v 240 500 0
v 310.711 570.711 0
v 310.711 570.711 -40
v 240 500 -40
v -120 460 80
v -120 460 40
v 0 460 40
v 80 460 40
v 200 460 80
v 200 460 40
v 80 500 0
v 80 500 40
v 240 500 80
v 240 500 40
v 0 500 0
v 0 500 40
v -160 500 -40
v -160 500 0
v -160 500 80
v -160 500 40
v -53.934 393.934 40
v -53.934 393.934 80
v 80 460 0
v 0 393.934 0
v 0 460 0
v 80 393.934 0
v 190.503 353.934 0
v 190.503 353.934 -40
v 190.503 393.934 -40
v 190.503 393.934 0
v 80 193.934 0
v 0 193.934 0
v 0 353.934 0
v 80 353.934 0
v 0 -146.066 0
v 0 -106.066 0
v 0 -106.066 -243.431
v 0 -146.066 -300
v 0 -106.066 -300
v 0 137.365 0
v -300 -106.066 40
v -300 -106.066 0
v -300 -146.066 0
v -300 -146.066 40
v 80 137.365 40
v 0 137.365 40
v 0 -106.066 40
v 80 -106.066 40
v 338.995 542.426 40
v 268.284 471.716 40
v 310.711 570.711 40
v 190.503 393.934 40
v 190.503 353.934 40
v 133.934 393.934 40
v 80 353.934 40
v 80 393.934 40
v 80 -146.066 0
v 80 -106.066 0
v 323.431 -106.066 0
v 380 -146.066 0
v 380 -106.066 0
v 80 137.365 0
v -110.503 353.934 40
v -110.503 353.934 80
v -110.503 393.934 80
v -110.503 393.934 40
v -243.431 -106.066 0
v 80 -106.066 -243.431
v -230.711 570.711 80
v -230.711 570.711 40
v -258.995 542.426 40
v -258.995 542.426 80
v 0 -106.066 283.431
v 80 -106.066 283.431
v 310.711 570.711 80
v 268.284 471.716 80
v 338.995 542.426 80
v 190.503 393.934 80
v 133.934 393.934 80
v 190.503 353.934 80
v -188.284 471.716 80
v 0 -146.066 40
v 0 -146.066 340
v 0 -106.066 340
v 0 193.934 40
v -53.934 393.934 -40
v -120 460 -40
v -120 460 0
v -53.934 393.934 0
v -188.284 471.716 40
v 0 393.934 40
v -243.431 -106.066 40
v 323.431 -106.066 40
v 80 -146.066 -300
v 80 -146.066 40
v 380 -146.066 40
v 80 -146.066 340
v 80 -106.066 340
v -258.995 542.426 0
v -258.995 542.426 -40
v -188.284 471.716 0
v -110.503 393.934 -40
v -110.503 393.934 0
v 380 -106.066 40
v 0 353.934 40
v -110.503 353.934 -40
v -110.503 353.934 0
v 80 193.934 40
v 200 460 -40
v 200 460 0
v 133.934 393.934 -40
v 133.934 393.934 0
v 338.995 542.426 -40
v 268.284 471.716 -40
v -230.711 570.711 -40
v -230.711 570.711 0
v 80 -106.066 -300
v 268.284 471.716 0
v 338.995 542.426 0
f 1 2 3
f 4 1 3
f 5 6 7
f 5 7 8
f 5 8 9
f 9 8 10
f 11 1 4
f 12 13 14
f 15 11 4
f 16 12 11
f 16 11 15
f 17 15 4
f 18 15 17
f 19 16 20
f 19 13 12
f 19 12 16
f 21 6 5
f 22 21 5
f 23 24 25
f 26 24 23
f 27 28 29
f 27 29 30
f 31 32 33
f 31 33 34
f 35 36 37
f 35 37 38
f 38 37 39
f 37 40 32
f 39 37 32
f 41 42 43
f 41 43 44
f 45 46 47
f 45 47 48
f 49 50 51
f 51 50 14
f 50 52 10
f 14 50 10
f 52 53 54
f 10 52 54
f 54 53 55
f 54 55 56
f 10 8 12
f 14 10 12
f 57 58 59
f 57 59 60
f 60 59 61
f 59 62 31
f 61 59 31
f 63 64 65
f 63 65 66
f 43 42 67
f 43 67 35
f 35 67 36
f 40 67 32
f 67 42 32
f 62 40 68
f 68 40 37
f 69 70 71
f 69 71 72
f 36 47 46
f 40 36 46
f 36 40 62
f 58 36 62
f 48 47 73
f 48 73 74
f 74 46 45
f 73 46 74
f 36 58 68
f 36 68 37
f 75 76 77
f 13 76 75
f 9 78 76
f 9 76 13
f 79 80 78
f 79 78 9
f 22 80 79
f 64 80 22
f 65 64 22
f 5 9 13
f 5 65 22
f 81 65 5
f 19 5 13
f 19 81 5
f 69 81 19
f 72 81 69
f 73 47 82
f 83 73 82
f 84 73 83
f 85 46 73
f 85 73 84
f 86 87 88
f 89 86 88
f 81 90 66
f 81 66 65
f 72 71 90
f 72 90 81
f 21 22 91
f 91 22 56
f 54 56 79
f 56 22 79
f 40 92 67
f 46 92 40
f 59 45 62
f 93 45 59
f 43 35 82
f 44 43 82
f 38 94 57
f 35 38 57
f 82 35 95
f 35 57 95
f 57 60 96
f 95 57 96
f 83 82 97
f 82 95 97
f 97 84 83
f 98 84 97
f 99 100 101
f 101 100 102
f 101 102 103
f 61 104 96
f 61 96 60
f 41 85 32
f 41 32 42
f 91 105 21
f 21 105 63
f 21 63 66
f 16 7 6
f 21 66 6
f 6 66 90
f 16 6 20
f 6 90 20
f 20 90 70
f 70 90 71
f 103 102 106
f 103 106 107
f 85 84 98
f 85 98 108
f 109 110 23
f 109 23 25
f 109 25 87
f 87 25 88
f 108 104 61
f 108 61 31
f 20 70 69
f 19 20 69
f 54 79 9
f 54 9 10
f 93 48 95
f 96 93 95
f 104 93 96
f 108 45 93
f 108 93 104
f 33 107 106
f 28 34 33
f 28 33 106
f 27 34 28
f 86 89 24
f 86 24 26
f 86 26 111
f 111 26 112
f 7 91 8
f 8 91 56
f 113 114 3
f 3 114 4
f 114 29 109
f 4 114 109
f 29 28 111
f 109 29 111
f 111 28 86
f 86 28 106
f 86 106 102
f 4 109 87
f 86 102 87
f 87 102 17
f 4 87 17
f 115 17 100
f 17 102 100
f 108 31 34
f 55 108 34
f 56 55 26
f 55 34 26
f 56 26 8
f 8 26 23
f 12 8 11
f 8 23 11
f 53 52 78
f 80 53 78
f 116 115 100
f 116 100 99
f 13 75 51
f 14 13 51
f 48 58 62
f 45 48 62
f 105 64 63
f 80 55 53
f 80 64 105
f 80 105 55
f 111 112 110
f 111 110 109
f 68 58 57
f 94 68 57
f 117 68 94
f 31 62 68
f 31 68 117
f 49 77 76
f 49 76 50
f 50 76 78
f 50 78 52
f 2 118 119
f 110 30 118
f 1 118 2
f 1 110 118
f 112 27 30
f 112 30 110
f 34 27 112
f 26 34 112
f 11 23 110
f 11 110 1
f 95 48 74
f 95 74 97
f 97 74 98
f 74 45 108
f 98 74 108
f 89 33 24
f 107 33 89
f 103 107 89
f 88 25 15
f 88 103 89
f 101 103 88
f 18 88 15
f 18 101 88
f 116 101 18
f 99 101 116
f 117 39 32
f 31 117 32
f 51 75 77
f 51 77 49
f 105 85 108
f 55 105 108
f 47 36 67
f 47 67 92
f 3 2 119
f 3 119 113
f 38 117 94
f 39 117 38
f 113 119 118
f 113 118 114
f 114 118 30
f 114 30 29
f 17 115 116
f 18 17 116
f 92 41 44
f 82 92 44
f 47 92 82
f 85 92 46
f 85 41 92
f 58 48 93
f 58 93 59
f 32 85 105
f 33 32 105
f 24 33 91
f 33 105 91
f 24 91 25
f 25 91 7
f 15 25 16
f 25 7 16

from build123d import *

# Parameters (mm, degrees)
SKETCH_1_W          = 80
SKETCH_1_H          = 40
EXTRUDE_1_DEPTH     = 500
SKETCH_2_W          = 400
SKETCH_2_H          = 40
EXTRUDE_2_DEPTH     = 40
SKETCH_3_W          = 400
SKETCH_3_H          = 40
EXTRUDE_3_DEPTH     = 40
CUT_EXTRUDE_1_DEPTH = 121
SKETCH_5_W          = 40
SKETCH_5_H          = 150
EXTRUDE_4_DEPTH     = 40
SKETCH_6_W          = 40
SKETCH_6_H          = 40
EXTRUDE_5_DEPTH     = 100
SKETCH_7_W          = 40
SKETCH_7_H          = 150
EXTRUDE_6_DEPTH     = 40
SKETCH_8_W          = 40
SKETCH_8_H          = 40
EXTRUDE_7_DEPTH     = 100
SKETCH_9_W          = 40
SKETCH_9_H          = 150
EXTRUDE_8_DEPTH     = 40
SKETCH_10_W         = 40
SKETCH_10_H         = 40
EXTRUDE_9_DEPTH     = 100
CUT_EXTRUDE_2_DEPTH = 121
SKETCH_13_W         = 301.005050634
SKETCH_13_H         = 40
EXTRUDE_10_DEPTH    = 40
SKETCH_14_W         = 40
SKETCH_14_H         = 40
EXTRUDE_11_DEPTH    = 500
SKETCH_15_W         = 80
SKETCH_15_H         = 40
EXTRUDE_12_DEPTH    = 146.066017
EXTRUDE_13_REACH    = 411.497
SKETCH_17_W         = 40
SKETCH_17_H         = 40
CUT_EXTRUDE_3_DEPTH = 500
SKETCH_19_W         = 80
SKETCH_19_H         = 40
EXTRUDE_14_DEPTH    = 500
SKETCH_20_W         = 80
SKETCH_20_H         = 40
EXTRUDE_15_DEPTH    = 300
SKETCH_21_W         = 40
SKETCH_21_H         = 40
EXTRUDE_16_DEPTH    = 300
SKETCH_22_W         = 80
SKETCH_22_H         = 40
EXTRUDE_17_DEPTH    = 300
SKETCH_23_W         = 40
SKETCH_23_H         = 40
EXTRUDE_18_DEPTH    = 300
EXTRUDE_19_DEPTH    = 40
EXTRUDE_20_DEPTH    = 40
EXTRUDE_21_DEPTH    = 80
EXTRUDE_22_DEPTH    = 80


with BuildPart() as part:
    # 草图1 → 凸台-拉伸1 (new body)
    with BuildSketch(Plane(origin=(0, 0, 0), x_dir=(1, 0, 0), z_dir=(0, 1, 0))):
        with Locations((40, -20)):
            Rectangle(SKETCH_1_W, SKETCH_1_H)
    extrude(amount=EXTRUDE_1_DEPTH)

    # 草图2 → 凸台-拉伸2 (add)
    with BuildSketch(Plane.XY.offset(40)):
        with Locations((40, 480)):
            Rectangle(SKETCH_2_W, SKETCH_2_H)
    extrude(amount=EXTRUDE_2_DEPTH)

    # 草图3 → 凸台-拉伸3 (add)
    with BuildSketch(Plane(origin=(0, 0, 0), x_dir=(-1, 0, 0), z_dir=(0, 0, -1))):
        with Locations((-40, 480)):
            Rectangle(SKETCH_3_W, SKETCH_3_H)
    extrude(amount=EXTRUDE_3_DEPTH)

    # 草图4 → 切除-拉伸1 (cut, through all)
    with BuildSketch(Plane.XY.offset(80)):
        Polygon((-160, 500), (-120, 460), (-160, 460), align=None)
        Polygon((240, 500), (200, 460), (240, 460), align=None)
    extrude(amount=-CUT_EXTRUDE_1_DEPTH, mode=Mode.SUBTRACT)

    # 草图5 → 凸台-拉伸4 (add)
    with BuildSketch(Plane(origin=(-130, 130, 0), x_dir=(0, 0, -1), z_dir=(0.707106781, -0.707106781, 0))):
        with Locations((-60, 448.259018078)):
            Rectangle(SKETCH_5_W, SKETCH_5_H)
    extrude(amount=EXTRUDE_4_DEPTH)

    # 草图6 → 凸台-拉伸5 (add)
    with BuildSketch(Plane(origin=(370, 370, 0), x_dir=(0, 0, -1), z_dir=(0.707106781, 0.707106781, 0))):
        with Locations((-60, 163.847763108)):
            Rectangle(SKETCH_6_W, SKETCH_6_H)
    extrude(amount=EXTRUDE_5_DEPTH)

    # 草图7 → 凸台-拉伸6 (add)
    with BuildSketch(Plane(origin=(-130, 130, 0), x_dir=(0, 0, -1), z_dir=(0.707106781, -0.707106781, 0))):
        with Locations((20, 448.259018078)):
            Rectangle(SKETCH_7_W, SKETCH_7_H)
    extrude(amount=EXTRUDE_6_DEPTH)

    # 草图8 → 凸台-拉伸7 (add)
    with BuildSketch(Plane(origin=(370, 370, 0), x_dir=(0, 0, -1), z_dir=(0.707106781, 0.707106781, 0))):
        with Locations((20, 163.847763108)):
            Rectangle(SKETCH_8_W, SKETCH_8_H)
    extrude(amount=EXTRUDE_7_DEPTH)

    # 草图9 → 凸台-拉伸8 (add)
    with BuildSketch(Plane(origin=(170, 170, 0), x_dir=(0, 0, 1), z_dir=(-0.707106781, -0.707106781, 0))):
        with Locations((-20, 391.690475583)):
            Rectangle(SKETCH_9_W, SKETCH_9_H)
        with Locations((60, 391.690475583)):
            Rectangle(SKETCH_9_W, SKETCH_9_H)
    extrude(amount=EXTRUDE_8_DEPTH)

    # 草图10 → 凸台-拉伸9 (add)
    with BuildSketch(Plane(origin=(-330, 330, 0), x_dir=(0, 0, 1), z_dir=(-0.707106781, 0.707106781, 0))):
        with Locations((-20, 220.416305603)):
            Rectangle(SKETCH_10_W, SKETCH_10_H)
        with Locations((60, 220.416305603)):
            Rectangle(SKETCH_10_W, SKETCH_10_H)
    extrude(amount=EXTRUDE_9_DEPTH)

    # 草图12 → 切除-拉伸2 (cut, through all)
    with BuildSketch(Plane.XY.offset(80)):
        Polygon((-82.218254069, 365.649711575), (-53.933982822, 393.933982822), (-110.502525317, 393.933982822), align=None)
        Polygon((133.933982822, 393.933982822), (162.218254069, 365.649711575), (190.502525317, 393.933982822), align=None)
    extrude(amount=-CUT_EXTRUDE_2_DEPTH, mode=Mode.SUBTRACT)

    # 草图13 → 凸台-拉伸10 (add)
    with BuildSketch(Plane.XZ.offset(-393.933982822)):
        with Locations((40, 60)):
            Rectangle(SKETCH_13_W, SKETCH_13_H)
        with Locations((40, -20)):
            Rectangle(SKETCH_13_W, SKETCH_13_H)
    extrude(amount=EXTRUDE_10_DEPTH)

    # 草图14 → 凸台-拉伸11 (add)
    with BuildSketch(Plane(origin=(0, 353.933982822, 0), x_dir=(-1, 0, 0), z_dir=(0, -1, 0))):
        with Locations((90.502525317, -60)):
            Rectangle(SKETCH_14_W, SKETCH_14_H)
        with Locations((90.502525317, 20)):
            Rectangle(SKETCH_14_W, SKETCH_14_H)
        with Locations((-170.502525317, -60)):
            Rectangle(SKETCH_14_W, SKETCH_14_H)
        with Locations((-170.502525317, 20)):
            Rectangle(SKETCH_14_W, SKETCH_14_H)
    extrude(amount=EXTRUDE_11_DEPTH)

    # 草图15 → 凸台-拉伸12 (add)
    with BuildSketch(Plane.XZ):
        with Locations((40, 20)):
            Rectangle(SKETCH_15_W, SKETCH_15_H)
    extrude(amount=EXTRUDE_12_DEPTH)

    # 草图17 → 凸台-拉伸13 (add, up to next)
    with BuildSketch(Plane(origin=(-70.502525317, 0, 0), x_dir=(0, 0, -1), z_dir=(1, 0, 0)), mode=Mode.PRIVATE) as extrude_13_sk1:
        with Locations((-60, -126.066017178)):
            Rectangle(SKETCH_17_W, SKETCH_17_H)
    extrude_13_tool1 = extrude(extrude_13_sk1.sketch, amount=EXTRUDE_13_REACH, mode=Mode.PRIVATE) - part.part
    add(extrude_13_tool1.solids().sort_by_distance((-70.502525, -126.066017, 60))[0])
    # 草图17 → 凸台-拉伸13 (add, up to next)
    with BuildSketch(Plane(origin=(-70.502525317, 0, 0), x_dir=(0, 0, -1), z_dir=(1, 0, 0)), mode=Mode.PRIVATE) as extrude_13_sk2:
        with Locations((20, -126.066017178)):
            Rectangle(SKETCH_17_W, SKETCH_17_H)
    extrude_13_tool2 = extrude(extrude_13_sk2.sketch, amount=EXTRUDE_13_REACH, mode=Mode.PRIVATE) - part.part
    add(extrude_13_tool2.solids().sort_by_distance((-70.502525, -126.066017, -20))[0])

    # 草图18 → 切除-拉伸3 (cut)
    with BuildSketch(Plane.XZ.offset(146.066017178)):
        Polygon((-110.502525317, 80), (-110.502525317, 40), (0, 40), (0, 0), (-110.502525317, 0), (-110.502525317, -40), (190.502525317, -40), (190.502525317, 0), (80, 0), (80, 40), (190.502525317, 40), (190.502525317, 80), align=None)
    extrude(amount=-CUT_EXTRUDE_3_DEPTH, mode=Mode.SUBTRACT)

    # 草图19 → 凸台-拉伸14 (add)
    with BuildSketch(Plane.XZ.offset(-353.933982822)):
        with Locations((40, 20)):
            Rectangle(SKETCH_19_W, SKETCH_19_H)
    extrude(amount=EXTRUDE_14_DEPTH)

    # 草图20 → 凸台-拉伸15 (add)
    with BuildSketch(Plane.XY.offset(40)):
        with Locations((40, -126.066017178)):
            Rectangle(SKETCH_20_W, SKETCH_20_H)
    extrude(amount=EXTRUDE_15_DEPTH)

    # 草图21 → 凸台-拉伸16 (add)
    with BuildSketch(Plane(origin=(80, 0, 0), x_dir=(0, 0, -1), z_dir=(1, 0, 0))):
        with Locations((-20, -126.066017178)):
            Rectangle(SKETCH_21_W, SKETCH_21_H)
    extrude(amount=EXTRUDE_16_DEPTH)

    # 草图22 → 凸台-拉伸17 (add)
    with BuildSketch(Plane(origin=(0, 0, 0), x_dir=(-1, 0, 0), z_dir=(0, 0, -1))):
        with Locations((-40, -126.066017178)):
            Rectangle(SKETCH_22_W, SKETCH_22_H)
    extrude(amount=EXTRUDE_17_DEPTH)

    # 草图23 → 凸台-拉伸18 (add)
    with BuildSketch(Plane.ZY):
        with Locations((20, -126.066017178)):
            Rectangle(SKETCH_23_W, SKETCH_23_H)
    extrude(amount=EXTRUDE_18_DEPTH)

    # 草图24 → 凸台-拉伸19 (add)
    with BuildSketch(Plane.XY.offset(40)):
        Polygon((-243.431457505, -106.066017178), (0, 137.365440327), (0, 193.933982822), (-300, -106.066017178), align=None)
    extrude(amount=-EXTRUDE_19_DEPTH)

    # 草图25 → 凸台-拉伸20 (add)
    with BuildSketch(Plane.XY.offset(40)):
        Polygon((380, -106.066017178), (80, 193.933982822), (80, 137.365440327), (323.431457505, -106.066017178), align=None)
    extrude(amount=-EXTRUDE_20_DEPTH)

    # 草图26 → 凸台-拉伸21 (add)
    with BuildSketch(Plane.ZY):
        Polygon((-300, -106.066017178), (0, 193.933982822), (0, 137.365440327), (-243.431457505, -106.066017178), align=None)
    extrude(amount=-EXTRUDE_21_DEPTH)

    # 草图27 → 凸台-拉伸22 (add)
    with BuildSketch(Plane.ZY):
        Polygon((340, -106.066017178), (40, 193.933982822), (40, 137.365440327), (283.431457505, -106.066017178), align=None)
    extrude(amount=-EXTRUDE_22_DEPTH)


solid = part.part
